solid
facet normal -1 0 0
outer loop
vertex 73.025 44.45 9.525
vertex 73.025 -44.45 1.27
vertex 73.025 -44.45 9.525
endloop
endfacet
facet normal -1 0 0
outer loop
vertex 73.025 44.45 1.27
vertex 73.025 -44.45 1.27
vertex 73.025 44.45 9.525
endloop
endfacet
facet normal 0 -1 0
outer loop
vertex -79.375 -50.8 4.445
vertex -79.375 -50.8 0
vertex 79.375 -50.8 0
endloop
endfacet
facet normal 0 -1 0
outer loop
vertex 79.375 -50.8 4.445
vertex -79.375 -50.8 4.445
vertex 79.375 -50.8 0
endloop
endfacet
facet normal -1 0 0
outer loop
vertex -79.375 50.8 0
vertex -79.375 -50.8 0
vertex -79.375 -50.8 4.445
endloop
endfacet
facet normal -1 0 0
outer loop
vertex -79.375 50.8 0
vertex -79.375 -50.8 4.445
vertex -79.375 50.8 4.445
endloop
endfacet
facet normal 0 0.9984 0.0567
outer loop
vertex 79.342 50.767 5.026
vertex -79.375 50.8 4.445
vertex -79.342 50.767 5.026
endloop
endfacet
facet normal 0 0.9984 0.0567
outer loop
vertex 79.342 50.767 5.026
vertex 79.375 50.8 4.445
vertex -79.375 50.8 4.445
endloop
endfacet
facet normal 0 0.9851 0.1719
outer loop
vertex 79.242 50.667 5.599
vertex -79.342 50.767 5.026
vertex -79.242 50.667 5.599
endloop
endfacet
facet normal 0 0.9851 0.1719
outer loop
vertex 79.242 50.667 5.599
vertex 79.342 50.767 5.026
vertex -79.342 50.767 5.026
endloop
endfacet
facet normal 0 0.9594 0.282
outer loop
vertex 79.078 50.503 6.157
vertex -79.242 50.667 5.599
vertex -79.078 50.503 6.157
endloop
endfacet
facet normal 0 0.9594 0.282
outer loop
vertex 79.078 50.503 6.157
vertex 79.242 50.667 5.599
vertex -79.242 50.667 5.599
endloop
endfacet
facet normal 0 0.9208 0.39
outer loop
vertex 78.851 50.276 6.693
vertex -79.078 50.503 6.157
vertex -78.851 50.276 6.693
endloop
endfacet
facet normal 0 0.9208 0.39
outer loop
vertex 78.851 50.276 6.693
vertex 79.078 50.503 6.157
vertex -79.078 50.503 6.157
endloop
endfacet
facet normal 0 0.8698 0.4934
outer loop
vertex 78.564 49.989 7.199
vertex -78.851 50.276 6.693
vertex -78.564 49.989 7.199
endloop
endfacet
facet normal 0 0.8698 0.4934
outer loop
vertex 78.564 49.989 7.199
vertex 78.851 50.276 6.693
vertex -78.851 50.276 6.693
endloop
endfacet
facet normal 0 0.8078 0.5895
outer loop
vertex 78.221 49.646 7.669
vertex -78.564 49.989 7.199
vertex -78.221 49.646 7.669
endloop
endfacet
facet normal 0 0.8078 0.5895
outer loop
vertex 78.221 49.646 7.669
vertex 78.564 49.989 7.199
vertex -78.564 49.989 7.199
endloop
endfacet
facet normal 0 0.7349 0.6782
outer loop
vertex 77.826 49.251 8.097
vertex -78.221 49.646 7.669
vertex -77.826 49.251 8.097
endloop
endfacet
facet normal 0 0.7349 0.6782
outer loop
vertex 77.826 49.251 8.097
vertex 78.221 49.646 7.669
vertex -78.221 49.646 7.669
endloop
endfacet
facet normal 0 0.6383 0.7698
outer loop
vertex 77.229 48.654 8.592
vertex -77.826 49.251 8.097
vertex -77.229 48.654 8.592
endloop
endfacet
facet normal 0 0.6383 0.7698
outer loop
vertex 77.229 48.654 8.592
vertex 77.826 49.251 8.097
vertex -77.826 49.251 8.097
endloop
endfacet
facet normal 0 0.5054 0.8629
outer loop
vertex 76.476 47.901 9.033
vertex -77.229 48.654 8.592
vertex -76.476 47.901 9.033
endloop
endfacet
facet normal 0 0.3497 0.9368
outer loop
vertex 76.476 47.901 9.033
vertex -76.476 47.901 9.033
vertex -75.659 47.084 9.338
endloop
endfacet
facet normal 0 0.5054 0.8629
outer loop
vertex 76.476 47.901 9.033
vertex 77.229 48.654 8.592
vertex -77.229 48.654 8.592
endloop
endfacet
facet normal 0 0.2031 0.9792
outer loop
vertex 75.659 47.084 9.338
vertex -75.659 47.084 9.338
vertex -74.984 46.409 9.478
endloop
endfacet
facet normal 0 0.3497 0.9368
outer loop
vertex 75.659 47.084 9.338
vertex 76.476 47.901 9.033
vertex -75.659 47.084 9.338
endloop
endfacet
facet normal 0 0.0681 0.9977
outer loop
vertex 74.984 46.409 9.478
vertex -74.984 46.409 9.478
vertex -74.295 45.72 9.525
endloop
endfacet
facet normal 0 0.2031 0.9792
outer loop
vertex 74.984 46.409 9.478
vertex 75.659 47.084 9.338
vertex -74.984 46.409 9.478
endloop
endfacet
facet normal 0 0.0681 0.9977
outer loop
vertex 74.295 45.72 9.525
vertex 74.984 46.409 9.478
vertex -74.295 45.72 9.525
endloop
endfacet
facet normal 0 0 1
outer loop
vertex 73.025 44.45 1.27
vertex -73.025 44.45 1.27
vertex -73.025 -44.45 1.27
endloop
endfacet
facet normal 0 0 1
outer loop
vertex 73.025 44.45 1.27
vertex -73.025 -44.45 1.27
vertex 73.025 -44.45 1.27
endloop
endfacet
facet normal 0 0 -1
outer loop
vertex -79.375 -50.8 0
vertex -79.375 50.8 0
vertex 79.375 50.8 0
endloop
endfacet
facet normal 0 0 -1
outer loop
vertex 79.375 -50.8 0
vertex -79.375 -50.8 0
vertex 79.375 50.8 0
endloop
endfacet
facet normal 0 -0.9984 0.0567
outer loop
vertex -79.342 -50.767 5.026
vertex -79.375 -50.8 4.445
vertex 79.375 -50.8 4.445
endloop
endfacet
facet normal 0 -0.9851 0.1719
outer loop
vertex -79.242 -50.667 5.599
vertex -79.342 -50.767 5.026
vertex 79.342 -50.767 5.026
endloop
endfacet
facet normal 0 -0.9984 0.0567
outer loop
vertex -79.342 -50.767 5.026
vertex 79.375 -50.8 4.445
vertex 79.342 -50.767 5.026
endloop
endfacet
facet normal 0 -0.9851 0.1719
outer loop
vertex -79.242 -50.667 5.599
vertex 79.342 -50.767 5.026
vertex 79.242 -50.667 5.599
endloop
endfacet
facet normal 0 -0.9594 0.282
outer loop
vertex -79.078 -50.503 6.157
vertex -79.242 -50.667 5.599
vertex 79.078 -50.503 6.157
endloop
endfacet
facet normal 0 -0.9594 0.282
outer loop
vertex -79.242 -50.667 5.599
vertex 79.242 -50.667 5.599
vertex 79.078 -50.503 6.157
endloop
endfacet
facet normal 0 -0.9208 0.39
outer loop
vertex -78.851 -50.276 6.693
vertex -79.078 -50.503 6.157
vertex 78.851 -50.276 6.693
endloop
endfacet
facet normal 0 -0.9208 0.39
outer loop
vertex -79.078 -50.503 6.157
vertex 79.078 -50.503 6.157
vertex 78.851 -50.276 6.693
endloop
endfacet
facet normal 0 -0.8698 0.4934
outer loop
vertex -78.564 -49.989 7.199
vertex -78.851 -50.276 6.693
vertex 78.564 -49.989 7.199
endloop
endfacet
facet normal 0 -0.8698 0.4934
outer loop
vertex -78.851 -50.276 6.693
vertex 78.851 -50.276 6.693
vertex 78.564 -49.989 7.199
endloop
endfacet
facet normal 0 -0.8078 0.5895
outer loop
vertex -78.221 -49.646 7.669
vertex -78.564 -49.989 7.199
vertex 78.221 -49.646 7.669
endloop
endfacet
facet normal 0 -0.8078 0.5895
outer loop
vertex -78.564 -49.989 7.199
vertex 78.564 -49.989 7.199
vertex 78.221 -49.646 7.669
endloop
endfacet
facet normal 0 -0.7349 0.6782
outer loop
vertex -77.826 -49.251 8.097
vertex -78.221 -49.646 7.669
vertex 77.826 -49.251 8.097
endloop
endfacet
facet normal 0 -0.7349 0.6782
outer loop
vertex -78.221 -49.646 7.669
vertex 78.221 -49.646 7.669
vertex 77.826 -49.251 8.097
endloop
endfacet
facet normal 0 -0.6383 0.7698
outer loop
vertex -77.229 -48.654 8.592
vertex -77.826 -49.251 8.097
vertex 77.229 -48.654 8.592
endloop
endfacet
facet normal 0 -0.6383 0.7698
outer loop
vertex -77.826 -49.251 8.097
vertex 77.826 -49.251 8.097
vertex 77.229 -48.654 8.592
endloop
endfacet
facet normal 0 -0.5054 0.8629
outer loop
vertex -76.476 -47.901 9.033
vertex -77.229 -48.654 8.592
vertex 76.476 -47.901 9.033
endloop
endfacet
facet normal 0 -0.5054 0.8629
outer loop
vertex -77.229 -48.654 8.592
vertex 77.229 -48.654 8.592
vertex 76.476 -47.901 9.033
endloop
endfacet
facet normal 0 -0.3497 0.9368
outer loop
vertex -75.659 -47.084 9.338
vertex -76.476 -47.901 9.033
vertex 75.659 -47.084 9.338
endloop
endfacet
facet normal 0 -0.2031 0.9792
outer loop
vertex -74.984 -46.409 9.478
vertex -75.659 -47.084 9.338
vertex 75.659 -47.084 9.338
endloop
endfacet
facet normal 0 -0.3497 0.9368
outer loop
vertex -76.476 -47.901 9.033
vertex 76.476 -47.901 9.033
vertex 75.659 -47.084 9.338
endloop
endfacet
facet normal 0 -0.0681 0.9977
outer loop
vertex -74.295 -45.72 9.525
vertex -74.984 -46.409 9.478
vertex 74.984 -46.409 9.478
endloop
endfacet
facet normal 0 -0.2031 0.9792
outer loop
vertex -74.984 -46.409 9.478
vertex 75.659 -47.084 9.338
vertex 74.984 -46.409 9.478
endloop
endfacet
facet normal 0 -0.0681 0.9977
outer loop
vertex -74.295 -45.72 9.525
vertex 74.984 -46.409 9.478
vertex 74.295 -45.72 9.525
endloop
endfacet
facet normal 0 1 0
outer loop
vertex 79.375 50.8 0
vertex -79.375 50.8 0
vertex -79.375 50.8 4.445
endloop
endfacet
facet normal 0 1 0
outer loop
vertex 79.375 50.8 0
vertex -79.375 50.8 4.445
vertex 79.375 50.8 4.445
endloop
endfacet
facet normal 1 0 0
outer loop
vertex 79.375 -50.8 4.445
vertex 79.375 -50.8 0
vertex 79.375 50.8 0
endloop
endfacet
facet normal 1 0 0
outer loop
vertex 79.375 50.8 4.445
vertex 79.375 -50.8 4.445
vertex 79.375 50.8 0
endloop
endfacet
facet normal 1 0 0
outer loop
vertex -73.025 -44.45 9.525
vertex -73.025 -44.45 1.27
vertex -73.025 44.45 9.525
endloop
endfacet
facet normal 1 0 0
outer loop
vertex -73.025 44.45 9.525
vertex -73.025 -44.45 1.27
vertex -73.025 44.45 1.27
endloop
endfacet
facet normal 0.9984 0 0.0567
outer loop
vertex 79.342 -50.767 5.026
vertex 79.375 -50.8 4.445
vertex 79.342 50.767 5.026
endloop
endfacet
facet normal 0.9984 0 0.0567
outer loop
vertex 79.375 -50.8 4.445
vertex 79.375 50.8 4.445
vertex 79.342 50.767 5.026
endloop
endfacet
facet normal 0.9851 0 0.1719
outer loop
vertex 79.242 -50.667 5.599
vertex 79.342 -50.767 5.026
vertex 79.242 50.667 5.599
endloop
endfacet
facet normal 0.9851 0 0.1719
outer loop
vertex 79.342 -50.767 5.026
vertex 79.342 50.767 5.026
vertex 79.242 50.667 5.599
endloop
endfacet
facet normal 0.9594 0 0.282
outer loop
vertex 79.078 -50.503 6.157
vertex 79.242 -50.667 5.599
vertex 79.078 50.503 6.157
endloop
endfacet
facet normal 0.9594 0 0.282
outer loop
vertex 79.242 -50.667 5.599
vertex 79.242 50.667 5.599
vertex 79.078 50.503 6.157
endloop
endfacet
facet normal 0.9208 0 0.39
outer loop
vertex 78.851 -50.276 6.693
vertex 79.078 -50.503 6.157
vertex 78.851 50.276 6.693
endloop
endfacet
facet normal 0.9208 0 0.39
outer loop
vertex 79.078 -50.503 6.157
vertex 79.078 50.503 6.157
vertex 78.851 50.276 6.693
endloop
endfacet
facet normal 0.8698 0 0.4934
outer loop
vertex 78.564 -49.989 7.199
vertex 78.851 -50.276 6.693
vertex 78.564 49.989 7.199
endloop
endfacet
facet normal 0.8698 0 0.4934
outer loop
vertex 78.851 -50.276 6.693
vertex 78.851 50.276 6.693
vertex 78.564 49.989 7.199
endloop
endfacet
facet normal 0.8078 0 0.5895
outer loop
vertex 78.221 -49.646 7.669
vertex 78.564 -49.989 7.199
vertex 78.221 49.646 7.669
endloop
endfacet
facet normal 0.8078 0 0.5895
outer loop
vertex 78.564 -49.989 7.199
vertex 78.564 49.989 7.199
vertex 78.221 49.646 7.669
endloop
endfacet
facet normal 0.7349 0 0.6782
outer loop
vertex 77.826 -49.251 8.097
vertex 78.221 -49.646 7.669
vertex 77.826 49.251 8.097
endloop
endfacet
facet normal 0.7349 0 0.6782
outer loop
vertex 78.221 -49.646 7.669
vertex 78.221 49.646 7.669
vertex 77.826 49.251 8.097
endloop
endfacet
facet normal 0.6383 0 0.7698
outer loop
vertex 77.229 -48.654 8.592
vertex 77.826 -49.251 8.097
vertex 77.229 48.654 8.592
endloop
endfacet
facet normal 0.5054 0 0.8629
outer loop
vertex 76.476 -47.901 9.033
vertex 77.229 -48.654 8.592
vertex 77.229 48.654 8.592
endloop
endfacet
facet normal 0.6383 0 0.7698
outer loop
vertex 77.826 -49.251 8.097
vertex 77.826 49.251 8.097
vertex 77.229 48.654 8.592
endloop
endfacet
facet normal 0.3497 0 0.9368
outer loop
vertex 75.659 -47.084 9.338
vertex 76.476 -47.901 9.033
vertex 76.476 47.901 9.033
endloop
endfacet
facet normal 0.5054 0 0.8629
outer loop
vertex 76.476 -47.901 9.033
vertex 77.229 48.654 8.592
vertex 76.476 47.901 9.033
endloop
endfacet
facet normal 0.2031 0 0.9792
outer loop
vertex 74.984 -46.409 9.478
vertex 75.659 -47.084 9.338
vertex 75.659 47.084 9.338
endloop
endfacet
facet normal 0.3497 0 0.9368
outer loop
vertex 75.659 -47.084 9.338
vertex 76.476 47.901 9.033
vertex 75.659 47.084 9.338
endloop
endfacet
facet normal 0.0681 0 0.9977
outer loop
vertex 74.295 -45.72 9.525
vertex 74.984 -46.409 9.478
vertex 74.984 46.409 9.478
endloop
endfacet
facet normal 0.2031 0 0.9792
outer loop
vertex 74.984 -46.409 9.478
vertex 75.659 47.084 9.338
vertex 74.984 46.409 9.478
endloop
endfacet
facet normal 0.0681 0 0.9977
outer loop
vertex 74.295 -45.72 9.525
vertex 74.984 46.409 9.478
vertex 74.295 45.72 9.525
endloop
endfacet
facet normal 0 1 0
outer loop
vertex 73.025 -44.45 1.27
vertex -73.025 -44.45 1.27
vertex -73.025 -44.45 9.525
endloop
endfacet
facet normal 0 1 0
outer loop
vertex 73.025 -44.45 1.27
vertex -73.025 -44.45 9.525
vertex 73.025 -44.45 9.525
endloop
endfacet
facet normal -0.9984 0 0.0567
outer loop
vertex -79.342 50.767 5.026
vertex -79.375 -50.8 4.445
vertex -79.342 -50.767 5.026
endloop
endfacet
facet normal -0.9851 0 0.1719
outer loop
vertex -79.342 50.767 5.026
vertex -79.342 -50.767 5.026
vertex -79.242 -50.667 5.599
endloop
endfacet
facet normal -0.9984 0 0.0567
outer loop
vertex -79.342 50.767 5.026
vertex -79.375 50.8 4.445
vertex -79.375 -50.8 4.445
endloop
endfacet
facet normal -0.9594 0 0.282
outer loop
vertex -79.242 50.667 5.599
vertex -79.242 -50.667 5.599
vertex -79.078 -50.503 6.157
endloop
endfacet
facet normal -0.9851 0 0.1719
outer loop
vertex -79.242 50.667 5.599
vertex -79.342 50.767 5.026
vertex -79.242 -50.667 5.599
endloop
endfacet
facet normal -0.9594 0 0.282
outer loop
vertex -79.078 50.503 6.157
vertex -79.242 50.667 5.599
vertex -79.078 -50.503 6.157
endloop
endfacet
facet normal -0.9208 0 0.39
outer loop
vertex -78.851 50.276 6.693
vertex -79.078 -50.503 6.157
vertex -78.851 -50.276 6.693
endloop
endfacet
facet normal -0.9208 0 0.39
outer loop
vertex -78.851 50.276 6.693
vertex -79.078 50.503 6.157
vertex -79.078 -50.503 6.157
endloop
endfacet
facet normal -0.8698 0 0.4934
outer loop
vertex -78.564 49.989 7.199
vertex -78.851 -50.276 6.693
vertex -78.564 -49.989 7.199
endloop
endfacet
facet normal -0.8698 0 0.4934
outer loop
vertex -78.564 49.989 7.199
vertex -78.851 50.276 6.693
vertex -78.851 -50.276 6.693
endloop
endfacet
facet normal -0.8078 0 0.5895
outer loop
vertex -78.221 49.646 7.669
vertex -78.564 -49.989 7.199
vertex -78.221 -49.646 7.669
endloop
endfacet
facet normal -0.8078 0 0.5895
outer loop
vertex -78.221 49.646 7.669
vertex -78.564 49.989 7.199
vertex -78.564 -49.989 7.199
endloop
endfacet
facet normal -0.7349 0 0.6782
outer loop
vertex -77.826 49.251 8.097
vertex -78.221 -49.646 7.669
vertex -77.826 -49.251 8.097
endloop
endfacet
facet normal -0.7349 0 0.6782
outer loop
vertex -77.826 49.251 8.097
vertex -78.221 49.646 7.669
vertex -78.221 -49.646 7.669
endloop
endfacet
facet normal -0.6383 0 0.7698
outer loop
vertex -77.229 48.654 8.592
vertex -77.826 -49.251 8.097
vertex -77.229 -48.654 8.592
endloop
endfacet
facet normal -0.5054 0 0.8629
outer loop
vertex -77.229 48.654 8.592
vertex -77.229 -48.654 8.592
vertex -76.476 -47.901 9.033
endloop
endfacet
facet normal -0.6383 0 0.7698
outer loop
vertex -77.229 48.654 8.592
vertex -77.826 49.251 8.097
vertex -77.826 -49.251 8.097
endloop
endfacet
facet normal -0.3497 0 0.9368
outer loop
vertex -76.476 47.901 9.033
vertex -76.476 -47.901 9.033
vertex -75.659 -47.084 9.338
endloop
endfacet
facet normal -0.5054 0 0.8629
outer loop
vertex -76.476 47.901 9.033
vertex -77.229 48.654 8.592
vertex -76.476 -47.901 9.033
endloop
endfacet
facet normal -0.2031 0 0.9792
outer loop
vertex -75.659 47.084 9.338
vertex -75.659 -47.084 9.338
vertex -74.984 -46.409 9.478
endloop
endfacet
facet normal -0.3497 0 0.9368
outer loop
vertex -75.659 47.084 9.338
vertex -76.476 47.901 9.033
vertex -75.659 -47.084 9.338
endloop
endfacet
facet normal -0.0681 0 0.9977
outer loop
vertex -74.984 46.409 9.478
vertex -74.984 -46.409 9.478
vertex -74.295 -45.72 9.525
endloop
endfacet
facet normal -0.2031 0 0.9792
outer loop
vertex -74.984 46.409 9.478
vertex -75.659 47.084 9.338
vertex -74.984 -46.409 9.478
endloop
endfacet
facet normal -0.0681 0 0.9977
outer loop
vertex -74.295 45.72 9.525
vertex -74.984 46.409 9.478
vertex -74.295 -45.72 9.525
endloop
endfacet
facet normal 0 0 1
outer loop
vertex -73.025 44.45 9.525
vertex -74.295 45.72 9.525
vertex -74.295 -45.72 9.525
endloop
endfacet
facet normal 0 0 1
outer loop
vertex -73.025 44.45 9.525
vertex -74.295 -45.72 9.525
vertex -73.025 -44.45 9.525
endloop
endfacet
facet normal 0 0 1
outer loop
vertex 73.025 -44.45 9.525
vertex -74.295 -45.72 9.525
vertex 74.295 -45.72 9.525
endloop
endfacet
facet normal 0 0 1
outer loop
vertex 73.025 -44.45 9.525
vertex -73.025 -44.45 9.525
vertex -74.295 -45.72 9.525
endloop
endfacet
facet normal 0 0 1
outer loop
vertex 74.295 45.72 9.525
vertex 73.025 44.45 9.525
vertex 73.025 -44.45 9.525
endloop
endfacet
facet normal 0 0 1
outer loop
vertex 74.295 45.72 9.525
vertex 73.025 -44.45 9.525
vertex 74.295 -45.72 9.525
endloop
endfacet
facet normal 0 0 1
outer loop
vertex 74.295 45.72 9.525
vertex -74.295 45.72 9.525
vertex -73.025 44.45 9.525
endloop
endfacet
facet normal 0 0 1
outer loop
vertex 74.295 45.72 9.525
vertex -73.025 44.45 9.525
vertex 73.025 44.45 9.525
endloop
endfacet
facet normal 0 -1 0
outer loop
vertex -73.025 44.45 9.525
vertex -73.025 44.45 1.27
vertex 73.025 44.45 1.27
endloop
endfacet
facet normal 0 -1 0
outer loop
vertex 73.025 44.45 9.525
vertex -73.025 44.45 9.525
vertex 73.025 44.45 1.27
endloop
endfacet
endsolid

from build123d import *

# Parameters (mm, degrees)
F0_W     = 158.75
F0_H     = 101.6
F0_W_2   = 146.05
F0_H_2   = 88.9
F1_DEPTH = 9.525
F2_R     = 5.08
F3_DEPTH = 1.27


with BuildPart() as f1:
    # F0 (on Top) → F1 (new body)
    with BuildSketch(Plane.XY):
        Rectangle(F0_W, F0_H)
        Rectangle(F0_W_2, F0_H_2, mode=Mode.SUBTRACT)
    extrude(amount=F1_DEPTH)

    # F2
    f2_edges = [f1.edges().sort_by_distance(p)[0] for p in [
        (-79.375, 0, 9.525),
        (0, -50.8, 9.525),
        (79.375, 0, 9.525),
        (0, 50.8, 9.525),
    ]]
    fillet(f2_edges, radius=F2_R)

    # F0 (on Top) → F3 (join)
    with BuildSketch(Plane.XY):
        Rectangle(F0_W_2, F0_H_2)
    extrude(amount=F3_DEPTH)


solid = f1.part
